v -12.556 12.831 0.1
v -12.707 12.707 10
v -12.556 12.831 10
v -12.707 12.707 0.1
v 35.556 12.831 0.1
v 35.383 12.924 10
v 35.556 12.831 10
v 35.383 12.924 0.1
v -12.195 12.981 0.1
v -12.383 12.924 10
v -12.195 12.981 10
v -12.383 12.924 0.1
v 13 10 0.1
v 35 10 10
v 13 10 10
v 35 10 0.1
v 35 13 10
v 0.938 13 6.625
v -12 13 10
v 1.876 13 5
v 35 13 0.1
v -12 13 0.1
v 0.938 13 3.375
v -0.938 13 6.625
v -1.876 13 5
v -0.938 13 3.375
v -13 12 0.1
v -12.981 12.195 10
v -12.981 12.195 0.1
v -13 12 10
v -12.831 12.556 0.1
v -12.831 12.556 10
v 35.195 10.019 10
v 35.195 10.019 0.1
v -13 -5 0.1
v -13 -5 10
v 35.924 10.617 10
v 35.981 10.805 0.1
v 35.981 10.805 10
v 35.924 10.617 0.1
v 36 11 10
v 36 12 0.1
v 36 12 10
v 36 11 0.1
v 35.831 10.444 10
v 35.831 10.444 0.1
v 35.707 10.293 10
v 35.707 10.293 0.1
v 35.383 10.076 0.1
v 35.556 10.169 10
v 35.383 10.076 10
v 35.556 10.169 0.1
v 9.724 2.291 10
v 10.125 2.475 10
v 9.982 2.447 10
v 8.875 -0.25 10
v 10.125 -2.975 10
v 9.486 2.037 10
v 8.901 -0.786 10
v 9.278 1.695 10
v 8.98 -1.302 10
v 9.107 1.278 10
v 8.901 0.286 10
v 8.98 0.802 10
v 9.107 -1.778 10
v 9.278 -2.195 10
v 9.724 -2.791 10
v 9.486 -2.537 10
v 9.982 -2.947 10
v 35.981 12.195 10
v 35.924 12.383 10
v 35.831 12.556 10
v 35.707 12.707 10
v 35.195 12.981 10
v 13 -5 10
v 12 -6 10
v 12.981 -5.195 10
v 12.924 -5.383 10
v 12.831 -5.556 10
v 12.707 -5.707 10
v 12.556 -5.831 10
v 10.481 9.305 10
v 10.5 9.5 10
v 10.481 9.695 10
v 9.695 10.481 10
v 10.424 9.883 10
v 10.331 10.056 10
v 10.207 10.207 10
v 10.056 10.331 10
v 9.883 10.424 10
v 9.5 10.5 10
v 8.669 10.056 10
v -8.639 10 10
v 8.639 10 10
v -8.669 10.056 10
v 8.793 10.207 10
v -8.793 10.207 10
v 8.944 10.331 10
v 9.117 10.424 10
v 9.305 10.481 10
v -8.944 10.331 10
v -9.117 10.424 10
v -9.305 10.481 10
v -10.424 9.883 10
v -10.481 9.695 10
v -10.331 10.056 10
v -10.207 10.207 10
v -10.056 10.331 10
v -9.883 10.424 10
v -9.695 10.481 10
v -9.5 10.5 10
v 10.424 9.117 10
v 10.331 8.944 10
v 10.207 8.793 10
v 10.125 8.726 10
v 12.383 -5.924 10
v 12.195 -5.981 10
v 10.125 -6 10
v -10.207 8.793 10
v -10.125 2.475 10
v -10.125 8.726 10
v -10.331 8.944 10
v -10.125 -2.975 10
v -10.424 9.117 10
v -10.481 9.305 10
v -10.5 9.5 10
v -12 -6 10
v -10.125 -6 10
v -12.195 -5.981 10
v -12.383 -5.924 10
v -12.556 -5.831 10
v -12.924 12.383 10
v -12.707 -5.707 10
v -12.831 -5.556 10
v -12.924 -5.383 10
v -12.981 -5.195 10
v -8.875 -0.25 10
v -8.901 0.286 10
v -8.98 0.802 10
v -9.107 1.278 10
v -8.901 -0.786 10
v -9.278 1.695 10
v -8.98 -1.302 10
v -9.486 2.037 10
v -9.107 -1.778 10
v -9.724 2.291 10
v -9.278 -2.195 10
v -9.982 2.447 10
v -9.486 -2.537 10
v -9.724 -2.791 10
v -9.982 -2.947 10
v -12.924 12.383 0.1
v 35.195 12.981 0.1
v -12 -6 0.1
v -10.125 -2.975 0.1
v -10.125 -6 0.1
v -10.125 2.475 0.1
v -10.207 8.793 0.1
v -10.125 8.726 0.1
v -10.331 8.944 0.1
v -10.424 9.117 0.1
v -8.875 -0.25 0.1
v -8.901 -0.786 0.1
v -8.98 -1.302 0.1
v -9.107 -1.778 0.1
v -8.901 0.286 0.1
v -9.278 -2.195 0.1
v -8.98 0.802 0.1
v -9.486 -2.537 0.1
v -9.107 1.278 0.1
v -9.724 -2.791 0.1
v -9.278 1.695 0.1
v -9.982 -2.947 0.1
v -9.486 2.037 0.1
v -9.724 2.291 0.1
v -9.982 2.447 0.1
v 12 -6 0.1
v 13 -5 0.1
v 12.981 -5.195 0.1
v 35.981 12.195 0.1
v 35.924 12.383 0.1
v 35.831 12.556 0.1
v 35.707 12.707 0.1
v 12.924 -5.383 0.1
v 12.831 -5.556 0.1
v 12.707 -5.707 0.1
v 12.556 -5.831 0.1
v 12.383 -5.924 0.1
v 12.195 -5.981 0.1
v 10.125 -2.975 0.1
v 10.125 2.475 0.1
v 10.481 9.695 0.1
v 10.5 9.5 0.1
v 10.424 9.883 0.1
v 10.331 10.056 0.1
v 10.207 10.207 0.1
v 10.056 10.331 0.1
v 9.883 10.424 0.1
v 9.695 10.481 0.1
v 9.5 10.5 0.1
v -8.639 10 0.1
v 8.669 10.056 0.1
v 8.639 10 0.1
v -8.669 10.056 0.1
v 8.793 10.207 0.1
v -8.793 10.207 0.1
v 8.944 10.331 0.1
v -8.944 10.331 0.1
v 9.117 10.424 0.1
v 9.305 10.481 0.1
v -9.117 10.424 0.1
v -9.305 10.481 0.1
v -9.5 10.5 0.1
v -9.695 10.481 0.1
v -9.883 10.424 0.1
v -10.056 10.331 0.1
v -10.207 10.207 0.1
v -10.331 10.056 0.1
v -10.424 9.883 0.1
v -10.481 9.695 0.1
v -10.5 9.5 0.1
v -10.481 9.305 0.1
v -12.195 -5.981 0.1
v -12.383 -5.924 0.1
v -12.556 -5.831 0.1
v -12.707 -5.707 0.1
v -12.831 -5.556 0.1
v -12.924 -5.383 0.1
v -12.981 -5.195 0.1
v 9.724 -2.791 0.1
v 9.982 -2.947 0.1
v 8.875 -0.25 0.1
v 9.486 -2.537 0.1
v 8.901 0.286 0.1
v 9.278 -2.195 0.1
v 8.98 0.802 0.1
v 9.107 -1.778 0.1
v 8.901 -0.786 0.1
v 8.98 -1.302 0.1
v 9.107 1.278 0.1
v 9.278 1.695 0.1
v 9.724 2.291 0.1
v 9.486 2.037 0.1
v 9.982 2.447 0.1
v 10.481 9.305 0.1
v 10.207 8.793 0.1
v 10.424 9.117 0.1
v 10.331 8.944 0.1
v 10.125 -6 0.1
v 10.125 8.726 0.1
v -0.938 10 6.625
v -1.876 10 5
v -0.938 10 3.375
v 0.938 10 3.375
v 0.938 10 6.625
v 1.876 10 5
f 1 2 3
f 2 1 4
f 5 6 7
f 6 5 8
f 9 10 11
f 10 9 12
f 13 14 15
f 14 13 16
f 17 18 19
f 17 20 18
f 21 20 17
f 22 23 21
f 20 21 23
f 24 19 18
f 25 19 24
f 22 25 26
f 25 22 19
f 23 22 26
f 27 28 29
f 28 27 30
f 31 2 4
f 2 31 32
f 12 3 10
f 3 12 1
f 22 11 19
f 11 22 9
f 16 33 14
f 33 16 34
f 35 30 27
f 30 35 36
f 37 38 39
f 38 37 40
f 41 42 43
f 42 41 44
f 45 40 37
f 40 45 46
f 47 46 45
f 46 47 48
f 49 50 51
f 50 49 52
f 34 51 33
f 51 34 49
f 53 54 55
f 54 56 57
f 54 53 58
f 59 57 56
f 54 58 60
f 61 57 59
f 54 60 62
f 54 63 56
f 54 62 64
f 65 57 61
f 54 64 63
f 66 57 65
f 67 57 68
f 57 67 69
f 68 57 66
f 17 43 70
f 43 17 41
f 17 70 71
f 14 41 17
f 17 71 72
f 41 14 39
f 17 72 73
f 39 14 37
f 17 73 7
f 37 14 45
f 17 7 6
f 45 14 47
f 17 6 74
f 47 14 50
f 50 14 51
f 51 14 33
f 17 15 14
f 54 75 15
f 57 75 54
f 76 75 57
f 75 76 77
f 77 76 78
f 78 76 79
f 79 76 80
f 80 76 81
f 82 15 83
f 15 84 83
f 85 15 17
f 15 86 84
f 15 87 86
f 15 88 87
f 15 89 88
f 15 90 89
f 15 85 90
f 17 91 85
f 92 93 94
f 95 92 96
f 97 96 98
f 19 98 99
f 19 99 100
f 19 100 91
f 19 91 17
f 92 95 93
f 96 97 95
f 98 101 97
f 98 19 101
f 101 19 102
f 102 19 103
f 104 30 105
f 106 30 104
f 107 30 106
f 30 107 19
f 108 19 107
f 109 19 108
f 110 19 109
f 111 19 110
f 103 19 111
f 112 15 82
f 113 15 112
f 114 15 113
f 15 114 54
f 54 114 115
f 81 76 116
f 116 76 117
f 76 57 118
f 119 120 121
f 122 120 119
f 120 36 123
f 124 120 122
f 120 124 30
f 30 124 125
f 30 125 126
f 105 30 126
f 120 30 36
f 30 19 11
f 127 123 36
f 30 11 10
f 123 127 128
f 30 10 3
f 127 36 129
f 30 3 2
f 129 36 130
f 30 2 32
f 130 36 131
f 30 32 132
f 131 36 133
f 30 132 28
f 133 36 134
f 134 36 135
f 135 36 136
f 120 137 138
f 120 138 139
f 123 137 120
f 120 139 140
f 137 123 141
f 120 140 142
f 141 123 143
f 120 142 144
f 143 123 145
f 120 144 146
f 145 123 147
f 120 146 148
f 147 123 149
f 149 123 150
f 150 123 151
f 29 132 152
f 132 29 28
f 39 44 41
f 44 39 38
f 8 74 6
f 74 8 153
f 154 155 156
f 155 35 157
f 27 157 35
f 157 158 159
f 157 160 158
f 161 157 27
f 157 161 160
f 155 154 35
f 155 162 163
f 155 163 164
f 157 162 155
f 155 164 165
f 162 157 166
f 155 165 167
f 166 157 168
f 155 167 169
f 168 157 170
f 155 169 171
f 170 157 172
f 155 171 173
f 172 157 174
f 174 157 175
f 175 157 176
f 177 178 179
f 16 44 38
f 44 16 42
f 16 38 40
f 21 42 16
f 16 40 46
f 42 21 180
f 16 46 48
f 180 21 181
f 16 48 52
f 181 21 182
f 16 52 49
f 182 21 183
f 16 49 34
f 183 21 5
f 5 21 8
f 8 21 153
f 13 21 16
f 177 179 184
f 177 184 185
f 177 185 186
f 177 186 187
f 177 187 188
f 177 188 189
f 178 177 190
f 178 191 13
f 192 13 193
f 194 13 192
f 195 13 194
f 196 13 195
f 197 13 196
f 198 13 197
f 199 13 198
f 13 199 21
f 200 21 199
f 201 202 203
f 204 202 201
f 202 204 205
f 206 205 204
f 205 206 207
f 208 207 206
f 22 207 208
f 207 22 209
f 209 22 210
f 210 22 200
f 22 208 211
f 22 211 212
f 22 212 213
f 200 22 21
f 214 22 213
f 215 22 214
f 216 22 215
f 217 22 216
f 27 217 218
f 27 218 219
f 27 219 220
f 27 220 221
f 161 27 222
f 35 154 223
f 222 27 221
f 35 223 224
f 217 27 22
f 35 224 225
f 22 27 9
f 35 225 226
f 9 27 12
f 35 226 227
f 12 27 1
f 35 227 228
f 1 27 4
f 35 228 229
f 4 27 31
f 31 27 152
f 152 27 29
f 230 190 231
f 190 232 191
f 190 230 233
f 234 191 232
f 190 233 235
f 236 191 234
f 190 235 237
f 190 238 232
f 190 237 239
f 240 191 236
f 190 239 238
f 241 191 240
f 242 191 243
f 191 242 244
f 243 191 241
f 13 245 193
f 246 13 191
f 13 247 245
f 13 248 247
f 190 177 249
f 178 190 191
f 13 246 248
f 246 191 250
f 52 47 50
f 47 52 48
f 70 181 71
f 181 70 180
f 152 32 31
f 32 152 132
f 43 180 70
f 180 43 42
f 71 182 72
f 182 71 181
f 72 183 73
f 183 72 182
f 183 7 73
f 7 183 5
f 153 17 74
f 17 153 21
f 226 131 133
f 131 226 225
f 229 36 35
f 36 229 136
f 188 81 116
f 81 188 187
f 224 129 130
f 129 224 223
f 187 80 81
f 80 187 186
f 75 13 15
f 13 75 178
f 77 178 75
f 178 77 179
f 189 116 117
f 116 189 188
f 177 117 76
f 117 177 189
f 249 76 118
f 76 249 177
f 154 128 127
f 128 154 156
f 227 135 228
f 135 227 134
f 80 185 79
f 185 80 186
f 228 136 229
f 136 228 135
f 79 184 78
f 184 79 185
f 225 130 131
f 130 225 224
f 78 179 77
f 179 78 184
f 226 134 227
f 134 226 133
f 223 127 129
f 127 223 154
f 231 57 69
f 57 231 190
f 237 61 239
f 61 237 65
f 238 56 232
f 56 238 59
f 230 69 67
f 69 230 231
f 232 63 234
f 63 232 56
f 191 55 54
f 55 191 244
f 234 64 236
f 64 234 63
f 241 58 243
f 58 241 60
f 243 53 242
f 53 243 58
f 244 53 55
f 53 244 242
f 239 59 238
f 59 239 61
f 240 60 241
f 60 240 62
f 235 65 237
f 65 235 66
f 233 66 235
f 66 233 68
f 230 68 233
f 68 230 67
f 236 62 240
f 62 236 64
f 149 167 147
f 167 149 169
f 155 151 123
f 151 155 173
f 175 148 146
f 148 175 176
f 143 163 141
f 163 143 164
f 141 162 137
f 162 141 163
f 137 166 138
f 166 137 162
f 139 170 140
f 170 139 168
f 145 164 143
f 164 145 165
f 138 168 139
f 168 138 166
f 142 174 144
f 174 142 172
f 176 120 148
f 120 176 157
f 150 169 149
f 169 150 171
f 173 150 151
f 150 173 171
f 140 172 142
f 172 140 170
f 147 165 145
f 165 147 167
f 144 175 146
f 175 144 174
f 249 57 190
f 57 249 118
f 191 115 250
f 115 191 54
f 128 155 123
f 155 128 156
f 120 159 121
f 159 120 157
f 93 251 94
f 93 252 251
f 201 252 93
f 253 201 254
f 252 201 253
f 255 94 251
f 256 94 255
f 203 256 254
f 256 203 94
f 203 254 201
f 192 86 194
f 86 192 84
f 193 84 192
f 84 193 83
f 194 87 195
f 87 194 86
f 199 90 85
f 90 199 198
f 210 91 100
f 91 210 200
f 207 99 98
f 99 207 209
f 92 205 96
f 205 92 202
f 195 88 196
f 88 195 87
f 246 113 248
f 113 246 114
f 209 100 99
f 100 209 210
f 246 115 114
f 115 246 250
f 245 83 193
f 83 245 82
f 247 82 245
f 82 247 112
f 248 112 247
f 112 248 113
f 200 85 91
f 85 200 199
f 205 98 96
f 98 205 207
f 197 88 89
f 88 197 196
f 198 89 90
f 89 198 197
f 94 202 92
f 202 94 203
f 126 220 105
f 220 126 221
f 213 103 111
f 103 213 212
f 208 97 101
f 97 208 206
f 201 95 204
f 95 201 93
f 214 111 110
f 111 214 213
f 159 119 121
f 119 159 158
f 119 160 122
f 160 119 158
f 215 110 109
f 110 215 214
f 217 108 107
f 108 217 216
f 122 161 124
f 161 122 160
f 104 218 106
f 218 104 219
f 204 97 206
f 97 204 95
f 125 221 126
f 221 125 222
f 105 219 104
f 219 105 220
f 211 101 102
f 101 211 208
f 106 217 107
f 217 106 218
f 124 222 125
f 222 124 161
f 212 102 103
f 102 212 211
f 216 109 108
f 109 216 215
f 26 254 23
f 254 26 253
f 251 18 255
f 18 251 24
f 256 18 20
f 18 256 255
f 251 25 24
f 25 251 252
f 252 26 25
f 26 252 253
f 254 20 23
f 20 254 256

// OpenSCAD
//clip for misumi extrusion
slop = .25;
ext_width = 20;
slot_width = 6;

wall = 3;
length = 10;
extra_width = 25;
nub = 1.5;

//change for screw holder - this is for m3
screw_dia = 3 + slop;
screw_rad = screw_dia/2;

%cube([ext_width-4, ext_width, ext_width], center=true);


translate([0,0,0]) rotate([0,0,0]) clip();
$fn=32;
module clip()
{
	rad = 1;
	difference(){
		union(){
			//clip
			translate([0,ext_width/4-wall/2,length/2])
			minkowski(){
				union(){
					cube([ext_width+wall+wall-rad*2,ext_width/2+wall+slot_width-rad*2,length-.2], center=true);
					translate([extra_width/2,ext_width/2-wall+rad,0]) cube([ext_width+extra_width,wall-rad*2,length-.2], center=true);
				}

				cylinder(r=rad, h=.1);
			}
		}

		//hollow out the inside
		difference(){
			translate([0,ext_width/4-wall-wall,length/2]) cube([ext_width+slop,ext_width/2+wall+wall+slot_width,length+.1],center=true);
	
			//nubs
			for(i=[0,1]) mirror([i,0,0]) translate([ext_width/2+slop,-slop,-.1]) scale([nub/(slot_width/2),1,1]) cylinder(r=slot_width/2-slop, h=length+.2);
		}

		for(i=[0,1]) mirror([i,0,0]) translate([ext_width/2-rad/2,ext_width/2-rad/2,-.1]) cylinder(r=rad, h=length+.2);

		//fixing screw
		translate([0,0,length/2]) rotate([90,0,0]) cylinder(r=screw_rad/cos(30), h=100, $fn=6, center=true);
	}
}
